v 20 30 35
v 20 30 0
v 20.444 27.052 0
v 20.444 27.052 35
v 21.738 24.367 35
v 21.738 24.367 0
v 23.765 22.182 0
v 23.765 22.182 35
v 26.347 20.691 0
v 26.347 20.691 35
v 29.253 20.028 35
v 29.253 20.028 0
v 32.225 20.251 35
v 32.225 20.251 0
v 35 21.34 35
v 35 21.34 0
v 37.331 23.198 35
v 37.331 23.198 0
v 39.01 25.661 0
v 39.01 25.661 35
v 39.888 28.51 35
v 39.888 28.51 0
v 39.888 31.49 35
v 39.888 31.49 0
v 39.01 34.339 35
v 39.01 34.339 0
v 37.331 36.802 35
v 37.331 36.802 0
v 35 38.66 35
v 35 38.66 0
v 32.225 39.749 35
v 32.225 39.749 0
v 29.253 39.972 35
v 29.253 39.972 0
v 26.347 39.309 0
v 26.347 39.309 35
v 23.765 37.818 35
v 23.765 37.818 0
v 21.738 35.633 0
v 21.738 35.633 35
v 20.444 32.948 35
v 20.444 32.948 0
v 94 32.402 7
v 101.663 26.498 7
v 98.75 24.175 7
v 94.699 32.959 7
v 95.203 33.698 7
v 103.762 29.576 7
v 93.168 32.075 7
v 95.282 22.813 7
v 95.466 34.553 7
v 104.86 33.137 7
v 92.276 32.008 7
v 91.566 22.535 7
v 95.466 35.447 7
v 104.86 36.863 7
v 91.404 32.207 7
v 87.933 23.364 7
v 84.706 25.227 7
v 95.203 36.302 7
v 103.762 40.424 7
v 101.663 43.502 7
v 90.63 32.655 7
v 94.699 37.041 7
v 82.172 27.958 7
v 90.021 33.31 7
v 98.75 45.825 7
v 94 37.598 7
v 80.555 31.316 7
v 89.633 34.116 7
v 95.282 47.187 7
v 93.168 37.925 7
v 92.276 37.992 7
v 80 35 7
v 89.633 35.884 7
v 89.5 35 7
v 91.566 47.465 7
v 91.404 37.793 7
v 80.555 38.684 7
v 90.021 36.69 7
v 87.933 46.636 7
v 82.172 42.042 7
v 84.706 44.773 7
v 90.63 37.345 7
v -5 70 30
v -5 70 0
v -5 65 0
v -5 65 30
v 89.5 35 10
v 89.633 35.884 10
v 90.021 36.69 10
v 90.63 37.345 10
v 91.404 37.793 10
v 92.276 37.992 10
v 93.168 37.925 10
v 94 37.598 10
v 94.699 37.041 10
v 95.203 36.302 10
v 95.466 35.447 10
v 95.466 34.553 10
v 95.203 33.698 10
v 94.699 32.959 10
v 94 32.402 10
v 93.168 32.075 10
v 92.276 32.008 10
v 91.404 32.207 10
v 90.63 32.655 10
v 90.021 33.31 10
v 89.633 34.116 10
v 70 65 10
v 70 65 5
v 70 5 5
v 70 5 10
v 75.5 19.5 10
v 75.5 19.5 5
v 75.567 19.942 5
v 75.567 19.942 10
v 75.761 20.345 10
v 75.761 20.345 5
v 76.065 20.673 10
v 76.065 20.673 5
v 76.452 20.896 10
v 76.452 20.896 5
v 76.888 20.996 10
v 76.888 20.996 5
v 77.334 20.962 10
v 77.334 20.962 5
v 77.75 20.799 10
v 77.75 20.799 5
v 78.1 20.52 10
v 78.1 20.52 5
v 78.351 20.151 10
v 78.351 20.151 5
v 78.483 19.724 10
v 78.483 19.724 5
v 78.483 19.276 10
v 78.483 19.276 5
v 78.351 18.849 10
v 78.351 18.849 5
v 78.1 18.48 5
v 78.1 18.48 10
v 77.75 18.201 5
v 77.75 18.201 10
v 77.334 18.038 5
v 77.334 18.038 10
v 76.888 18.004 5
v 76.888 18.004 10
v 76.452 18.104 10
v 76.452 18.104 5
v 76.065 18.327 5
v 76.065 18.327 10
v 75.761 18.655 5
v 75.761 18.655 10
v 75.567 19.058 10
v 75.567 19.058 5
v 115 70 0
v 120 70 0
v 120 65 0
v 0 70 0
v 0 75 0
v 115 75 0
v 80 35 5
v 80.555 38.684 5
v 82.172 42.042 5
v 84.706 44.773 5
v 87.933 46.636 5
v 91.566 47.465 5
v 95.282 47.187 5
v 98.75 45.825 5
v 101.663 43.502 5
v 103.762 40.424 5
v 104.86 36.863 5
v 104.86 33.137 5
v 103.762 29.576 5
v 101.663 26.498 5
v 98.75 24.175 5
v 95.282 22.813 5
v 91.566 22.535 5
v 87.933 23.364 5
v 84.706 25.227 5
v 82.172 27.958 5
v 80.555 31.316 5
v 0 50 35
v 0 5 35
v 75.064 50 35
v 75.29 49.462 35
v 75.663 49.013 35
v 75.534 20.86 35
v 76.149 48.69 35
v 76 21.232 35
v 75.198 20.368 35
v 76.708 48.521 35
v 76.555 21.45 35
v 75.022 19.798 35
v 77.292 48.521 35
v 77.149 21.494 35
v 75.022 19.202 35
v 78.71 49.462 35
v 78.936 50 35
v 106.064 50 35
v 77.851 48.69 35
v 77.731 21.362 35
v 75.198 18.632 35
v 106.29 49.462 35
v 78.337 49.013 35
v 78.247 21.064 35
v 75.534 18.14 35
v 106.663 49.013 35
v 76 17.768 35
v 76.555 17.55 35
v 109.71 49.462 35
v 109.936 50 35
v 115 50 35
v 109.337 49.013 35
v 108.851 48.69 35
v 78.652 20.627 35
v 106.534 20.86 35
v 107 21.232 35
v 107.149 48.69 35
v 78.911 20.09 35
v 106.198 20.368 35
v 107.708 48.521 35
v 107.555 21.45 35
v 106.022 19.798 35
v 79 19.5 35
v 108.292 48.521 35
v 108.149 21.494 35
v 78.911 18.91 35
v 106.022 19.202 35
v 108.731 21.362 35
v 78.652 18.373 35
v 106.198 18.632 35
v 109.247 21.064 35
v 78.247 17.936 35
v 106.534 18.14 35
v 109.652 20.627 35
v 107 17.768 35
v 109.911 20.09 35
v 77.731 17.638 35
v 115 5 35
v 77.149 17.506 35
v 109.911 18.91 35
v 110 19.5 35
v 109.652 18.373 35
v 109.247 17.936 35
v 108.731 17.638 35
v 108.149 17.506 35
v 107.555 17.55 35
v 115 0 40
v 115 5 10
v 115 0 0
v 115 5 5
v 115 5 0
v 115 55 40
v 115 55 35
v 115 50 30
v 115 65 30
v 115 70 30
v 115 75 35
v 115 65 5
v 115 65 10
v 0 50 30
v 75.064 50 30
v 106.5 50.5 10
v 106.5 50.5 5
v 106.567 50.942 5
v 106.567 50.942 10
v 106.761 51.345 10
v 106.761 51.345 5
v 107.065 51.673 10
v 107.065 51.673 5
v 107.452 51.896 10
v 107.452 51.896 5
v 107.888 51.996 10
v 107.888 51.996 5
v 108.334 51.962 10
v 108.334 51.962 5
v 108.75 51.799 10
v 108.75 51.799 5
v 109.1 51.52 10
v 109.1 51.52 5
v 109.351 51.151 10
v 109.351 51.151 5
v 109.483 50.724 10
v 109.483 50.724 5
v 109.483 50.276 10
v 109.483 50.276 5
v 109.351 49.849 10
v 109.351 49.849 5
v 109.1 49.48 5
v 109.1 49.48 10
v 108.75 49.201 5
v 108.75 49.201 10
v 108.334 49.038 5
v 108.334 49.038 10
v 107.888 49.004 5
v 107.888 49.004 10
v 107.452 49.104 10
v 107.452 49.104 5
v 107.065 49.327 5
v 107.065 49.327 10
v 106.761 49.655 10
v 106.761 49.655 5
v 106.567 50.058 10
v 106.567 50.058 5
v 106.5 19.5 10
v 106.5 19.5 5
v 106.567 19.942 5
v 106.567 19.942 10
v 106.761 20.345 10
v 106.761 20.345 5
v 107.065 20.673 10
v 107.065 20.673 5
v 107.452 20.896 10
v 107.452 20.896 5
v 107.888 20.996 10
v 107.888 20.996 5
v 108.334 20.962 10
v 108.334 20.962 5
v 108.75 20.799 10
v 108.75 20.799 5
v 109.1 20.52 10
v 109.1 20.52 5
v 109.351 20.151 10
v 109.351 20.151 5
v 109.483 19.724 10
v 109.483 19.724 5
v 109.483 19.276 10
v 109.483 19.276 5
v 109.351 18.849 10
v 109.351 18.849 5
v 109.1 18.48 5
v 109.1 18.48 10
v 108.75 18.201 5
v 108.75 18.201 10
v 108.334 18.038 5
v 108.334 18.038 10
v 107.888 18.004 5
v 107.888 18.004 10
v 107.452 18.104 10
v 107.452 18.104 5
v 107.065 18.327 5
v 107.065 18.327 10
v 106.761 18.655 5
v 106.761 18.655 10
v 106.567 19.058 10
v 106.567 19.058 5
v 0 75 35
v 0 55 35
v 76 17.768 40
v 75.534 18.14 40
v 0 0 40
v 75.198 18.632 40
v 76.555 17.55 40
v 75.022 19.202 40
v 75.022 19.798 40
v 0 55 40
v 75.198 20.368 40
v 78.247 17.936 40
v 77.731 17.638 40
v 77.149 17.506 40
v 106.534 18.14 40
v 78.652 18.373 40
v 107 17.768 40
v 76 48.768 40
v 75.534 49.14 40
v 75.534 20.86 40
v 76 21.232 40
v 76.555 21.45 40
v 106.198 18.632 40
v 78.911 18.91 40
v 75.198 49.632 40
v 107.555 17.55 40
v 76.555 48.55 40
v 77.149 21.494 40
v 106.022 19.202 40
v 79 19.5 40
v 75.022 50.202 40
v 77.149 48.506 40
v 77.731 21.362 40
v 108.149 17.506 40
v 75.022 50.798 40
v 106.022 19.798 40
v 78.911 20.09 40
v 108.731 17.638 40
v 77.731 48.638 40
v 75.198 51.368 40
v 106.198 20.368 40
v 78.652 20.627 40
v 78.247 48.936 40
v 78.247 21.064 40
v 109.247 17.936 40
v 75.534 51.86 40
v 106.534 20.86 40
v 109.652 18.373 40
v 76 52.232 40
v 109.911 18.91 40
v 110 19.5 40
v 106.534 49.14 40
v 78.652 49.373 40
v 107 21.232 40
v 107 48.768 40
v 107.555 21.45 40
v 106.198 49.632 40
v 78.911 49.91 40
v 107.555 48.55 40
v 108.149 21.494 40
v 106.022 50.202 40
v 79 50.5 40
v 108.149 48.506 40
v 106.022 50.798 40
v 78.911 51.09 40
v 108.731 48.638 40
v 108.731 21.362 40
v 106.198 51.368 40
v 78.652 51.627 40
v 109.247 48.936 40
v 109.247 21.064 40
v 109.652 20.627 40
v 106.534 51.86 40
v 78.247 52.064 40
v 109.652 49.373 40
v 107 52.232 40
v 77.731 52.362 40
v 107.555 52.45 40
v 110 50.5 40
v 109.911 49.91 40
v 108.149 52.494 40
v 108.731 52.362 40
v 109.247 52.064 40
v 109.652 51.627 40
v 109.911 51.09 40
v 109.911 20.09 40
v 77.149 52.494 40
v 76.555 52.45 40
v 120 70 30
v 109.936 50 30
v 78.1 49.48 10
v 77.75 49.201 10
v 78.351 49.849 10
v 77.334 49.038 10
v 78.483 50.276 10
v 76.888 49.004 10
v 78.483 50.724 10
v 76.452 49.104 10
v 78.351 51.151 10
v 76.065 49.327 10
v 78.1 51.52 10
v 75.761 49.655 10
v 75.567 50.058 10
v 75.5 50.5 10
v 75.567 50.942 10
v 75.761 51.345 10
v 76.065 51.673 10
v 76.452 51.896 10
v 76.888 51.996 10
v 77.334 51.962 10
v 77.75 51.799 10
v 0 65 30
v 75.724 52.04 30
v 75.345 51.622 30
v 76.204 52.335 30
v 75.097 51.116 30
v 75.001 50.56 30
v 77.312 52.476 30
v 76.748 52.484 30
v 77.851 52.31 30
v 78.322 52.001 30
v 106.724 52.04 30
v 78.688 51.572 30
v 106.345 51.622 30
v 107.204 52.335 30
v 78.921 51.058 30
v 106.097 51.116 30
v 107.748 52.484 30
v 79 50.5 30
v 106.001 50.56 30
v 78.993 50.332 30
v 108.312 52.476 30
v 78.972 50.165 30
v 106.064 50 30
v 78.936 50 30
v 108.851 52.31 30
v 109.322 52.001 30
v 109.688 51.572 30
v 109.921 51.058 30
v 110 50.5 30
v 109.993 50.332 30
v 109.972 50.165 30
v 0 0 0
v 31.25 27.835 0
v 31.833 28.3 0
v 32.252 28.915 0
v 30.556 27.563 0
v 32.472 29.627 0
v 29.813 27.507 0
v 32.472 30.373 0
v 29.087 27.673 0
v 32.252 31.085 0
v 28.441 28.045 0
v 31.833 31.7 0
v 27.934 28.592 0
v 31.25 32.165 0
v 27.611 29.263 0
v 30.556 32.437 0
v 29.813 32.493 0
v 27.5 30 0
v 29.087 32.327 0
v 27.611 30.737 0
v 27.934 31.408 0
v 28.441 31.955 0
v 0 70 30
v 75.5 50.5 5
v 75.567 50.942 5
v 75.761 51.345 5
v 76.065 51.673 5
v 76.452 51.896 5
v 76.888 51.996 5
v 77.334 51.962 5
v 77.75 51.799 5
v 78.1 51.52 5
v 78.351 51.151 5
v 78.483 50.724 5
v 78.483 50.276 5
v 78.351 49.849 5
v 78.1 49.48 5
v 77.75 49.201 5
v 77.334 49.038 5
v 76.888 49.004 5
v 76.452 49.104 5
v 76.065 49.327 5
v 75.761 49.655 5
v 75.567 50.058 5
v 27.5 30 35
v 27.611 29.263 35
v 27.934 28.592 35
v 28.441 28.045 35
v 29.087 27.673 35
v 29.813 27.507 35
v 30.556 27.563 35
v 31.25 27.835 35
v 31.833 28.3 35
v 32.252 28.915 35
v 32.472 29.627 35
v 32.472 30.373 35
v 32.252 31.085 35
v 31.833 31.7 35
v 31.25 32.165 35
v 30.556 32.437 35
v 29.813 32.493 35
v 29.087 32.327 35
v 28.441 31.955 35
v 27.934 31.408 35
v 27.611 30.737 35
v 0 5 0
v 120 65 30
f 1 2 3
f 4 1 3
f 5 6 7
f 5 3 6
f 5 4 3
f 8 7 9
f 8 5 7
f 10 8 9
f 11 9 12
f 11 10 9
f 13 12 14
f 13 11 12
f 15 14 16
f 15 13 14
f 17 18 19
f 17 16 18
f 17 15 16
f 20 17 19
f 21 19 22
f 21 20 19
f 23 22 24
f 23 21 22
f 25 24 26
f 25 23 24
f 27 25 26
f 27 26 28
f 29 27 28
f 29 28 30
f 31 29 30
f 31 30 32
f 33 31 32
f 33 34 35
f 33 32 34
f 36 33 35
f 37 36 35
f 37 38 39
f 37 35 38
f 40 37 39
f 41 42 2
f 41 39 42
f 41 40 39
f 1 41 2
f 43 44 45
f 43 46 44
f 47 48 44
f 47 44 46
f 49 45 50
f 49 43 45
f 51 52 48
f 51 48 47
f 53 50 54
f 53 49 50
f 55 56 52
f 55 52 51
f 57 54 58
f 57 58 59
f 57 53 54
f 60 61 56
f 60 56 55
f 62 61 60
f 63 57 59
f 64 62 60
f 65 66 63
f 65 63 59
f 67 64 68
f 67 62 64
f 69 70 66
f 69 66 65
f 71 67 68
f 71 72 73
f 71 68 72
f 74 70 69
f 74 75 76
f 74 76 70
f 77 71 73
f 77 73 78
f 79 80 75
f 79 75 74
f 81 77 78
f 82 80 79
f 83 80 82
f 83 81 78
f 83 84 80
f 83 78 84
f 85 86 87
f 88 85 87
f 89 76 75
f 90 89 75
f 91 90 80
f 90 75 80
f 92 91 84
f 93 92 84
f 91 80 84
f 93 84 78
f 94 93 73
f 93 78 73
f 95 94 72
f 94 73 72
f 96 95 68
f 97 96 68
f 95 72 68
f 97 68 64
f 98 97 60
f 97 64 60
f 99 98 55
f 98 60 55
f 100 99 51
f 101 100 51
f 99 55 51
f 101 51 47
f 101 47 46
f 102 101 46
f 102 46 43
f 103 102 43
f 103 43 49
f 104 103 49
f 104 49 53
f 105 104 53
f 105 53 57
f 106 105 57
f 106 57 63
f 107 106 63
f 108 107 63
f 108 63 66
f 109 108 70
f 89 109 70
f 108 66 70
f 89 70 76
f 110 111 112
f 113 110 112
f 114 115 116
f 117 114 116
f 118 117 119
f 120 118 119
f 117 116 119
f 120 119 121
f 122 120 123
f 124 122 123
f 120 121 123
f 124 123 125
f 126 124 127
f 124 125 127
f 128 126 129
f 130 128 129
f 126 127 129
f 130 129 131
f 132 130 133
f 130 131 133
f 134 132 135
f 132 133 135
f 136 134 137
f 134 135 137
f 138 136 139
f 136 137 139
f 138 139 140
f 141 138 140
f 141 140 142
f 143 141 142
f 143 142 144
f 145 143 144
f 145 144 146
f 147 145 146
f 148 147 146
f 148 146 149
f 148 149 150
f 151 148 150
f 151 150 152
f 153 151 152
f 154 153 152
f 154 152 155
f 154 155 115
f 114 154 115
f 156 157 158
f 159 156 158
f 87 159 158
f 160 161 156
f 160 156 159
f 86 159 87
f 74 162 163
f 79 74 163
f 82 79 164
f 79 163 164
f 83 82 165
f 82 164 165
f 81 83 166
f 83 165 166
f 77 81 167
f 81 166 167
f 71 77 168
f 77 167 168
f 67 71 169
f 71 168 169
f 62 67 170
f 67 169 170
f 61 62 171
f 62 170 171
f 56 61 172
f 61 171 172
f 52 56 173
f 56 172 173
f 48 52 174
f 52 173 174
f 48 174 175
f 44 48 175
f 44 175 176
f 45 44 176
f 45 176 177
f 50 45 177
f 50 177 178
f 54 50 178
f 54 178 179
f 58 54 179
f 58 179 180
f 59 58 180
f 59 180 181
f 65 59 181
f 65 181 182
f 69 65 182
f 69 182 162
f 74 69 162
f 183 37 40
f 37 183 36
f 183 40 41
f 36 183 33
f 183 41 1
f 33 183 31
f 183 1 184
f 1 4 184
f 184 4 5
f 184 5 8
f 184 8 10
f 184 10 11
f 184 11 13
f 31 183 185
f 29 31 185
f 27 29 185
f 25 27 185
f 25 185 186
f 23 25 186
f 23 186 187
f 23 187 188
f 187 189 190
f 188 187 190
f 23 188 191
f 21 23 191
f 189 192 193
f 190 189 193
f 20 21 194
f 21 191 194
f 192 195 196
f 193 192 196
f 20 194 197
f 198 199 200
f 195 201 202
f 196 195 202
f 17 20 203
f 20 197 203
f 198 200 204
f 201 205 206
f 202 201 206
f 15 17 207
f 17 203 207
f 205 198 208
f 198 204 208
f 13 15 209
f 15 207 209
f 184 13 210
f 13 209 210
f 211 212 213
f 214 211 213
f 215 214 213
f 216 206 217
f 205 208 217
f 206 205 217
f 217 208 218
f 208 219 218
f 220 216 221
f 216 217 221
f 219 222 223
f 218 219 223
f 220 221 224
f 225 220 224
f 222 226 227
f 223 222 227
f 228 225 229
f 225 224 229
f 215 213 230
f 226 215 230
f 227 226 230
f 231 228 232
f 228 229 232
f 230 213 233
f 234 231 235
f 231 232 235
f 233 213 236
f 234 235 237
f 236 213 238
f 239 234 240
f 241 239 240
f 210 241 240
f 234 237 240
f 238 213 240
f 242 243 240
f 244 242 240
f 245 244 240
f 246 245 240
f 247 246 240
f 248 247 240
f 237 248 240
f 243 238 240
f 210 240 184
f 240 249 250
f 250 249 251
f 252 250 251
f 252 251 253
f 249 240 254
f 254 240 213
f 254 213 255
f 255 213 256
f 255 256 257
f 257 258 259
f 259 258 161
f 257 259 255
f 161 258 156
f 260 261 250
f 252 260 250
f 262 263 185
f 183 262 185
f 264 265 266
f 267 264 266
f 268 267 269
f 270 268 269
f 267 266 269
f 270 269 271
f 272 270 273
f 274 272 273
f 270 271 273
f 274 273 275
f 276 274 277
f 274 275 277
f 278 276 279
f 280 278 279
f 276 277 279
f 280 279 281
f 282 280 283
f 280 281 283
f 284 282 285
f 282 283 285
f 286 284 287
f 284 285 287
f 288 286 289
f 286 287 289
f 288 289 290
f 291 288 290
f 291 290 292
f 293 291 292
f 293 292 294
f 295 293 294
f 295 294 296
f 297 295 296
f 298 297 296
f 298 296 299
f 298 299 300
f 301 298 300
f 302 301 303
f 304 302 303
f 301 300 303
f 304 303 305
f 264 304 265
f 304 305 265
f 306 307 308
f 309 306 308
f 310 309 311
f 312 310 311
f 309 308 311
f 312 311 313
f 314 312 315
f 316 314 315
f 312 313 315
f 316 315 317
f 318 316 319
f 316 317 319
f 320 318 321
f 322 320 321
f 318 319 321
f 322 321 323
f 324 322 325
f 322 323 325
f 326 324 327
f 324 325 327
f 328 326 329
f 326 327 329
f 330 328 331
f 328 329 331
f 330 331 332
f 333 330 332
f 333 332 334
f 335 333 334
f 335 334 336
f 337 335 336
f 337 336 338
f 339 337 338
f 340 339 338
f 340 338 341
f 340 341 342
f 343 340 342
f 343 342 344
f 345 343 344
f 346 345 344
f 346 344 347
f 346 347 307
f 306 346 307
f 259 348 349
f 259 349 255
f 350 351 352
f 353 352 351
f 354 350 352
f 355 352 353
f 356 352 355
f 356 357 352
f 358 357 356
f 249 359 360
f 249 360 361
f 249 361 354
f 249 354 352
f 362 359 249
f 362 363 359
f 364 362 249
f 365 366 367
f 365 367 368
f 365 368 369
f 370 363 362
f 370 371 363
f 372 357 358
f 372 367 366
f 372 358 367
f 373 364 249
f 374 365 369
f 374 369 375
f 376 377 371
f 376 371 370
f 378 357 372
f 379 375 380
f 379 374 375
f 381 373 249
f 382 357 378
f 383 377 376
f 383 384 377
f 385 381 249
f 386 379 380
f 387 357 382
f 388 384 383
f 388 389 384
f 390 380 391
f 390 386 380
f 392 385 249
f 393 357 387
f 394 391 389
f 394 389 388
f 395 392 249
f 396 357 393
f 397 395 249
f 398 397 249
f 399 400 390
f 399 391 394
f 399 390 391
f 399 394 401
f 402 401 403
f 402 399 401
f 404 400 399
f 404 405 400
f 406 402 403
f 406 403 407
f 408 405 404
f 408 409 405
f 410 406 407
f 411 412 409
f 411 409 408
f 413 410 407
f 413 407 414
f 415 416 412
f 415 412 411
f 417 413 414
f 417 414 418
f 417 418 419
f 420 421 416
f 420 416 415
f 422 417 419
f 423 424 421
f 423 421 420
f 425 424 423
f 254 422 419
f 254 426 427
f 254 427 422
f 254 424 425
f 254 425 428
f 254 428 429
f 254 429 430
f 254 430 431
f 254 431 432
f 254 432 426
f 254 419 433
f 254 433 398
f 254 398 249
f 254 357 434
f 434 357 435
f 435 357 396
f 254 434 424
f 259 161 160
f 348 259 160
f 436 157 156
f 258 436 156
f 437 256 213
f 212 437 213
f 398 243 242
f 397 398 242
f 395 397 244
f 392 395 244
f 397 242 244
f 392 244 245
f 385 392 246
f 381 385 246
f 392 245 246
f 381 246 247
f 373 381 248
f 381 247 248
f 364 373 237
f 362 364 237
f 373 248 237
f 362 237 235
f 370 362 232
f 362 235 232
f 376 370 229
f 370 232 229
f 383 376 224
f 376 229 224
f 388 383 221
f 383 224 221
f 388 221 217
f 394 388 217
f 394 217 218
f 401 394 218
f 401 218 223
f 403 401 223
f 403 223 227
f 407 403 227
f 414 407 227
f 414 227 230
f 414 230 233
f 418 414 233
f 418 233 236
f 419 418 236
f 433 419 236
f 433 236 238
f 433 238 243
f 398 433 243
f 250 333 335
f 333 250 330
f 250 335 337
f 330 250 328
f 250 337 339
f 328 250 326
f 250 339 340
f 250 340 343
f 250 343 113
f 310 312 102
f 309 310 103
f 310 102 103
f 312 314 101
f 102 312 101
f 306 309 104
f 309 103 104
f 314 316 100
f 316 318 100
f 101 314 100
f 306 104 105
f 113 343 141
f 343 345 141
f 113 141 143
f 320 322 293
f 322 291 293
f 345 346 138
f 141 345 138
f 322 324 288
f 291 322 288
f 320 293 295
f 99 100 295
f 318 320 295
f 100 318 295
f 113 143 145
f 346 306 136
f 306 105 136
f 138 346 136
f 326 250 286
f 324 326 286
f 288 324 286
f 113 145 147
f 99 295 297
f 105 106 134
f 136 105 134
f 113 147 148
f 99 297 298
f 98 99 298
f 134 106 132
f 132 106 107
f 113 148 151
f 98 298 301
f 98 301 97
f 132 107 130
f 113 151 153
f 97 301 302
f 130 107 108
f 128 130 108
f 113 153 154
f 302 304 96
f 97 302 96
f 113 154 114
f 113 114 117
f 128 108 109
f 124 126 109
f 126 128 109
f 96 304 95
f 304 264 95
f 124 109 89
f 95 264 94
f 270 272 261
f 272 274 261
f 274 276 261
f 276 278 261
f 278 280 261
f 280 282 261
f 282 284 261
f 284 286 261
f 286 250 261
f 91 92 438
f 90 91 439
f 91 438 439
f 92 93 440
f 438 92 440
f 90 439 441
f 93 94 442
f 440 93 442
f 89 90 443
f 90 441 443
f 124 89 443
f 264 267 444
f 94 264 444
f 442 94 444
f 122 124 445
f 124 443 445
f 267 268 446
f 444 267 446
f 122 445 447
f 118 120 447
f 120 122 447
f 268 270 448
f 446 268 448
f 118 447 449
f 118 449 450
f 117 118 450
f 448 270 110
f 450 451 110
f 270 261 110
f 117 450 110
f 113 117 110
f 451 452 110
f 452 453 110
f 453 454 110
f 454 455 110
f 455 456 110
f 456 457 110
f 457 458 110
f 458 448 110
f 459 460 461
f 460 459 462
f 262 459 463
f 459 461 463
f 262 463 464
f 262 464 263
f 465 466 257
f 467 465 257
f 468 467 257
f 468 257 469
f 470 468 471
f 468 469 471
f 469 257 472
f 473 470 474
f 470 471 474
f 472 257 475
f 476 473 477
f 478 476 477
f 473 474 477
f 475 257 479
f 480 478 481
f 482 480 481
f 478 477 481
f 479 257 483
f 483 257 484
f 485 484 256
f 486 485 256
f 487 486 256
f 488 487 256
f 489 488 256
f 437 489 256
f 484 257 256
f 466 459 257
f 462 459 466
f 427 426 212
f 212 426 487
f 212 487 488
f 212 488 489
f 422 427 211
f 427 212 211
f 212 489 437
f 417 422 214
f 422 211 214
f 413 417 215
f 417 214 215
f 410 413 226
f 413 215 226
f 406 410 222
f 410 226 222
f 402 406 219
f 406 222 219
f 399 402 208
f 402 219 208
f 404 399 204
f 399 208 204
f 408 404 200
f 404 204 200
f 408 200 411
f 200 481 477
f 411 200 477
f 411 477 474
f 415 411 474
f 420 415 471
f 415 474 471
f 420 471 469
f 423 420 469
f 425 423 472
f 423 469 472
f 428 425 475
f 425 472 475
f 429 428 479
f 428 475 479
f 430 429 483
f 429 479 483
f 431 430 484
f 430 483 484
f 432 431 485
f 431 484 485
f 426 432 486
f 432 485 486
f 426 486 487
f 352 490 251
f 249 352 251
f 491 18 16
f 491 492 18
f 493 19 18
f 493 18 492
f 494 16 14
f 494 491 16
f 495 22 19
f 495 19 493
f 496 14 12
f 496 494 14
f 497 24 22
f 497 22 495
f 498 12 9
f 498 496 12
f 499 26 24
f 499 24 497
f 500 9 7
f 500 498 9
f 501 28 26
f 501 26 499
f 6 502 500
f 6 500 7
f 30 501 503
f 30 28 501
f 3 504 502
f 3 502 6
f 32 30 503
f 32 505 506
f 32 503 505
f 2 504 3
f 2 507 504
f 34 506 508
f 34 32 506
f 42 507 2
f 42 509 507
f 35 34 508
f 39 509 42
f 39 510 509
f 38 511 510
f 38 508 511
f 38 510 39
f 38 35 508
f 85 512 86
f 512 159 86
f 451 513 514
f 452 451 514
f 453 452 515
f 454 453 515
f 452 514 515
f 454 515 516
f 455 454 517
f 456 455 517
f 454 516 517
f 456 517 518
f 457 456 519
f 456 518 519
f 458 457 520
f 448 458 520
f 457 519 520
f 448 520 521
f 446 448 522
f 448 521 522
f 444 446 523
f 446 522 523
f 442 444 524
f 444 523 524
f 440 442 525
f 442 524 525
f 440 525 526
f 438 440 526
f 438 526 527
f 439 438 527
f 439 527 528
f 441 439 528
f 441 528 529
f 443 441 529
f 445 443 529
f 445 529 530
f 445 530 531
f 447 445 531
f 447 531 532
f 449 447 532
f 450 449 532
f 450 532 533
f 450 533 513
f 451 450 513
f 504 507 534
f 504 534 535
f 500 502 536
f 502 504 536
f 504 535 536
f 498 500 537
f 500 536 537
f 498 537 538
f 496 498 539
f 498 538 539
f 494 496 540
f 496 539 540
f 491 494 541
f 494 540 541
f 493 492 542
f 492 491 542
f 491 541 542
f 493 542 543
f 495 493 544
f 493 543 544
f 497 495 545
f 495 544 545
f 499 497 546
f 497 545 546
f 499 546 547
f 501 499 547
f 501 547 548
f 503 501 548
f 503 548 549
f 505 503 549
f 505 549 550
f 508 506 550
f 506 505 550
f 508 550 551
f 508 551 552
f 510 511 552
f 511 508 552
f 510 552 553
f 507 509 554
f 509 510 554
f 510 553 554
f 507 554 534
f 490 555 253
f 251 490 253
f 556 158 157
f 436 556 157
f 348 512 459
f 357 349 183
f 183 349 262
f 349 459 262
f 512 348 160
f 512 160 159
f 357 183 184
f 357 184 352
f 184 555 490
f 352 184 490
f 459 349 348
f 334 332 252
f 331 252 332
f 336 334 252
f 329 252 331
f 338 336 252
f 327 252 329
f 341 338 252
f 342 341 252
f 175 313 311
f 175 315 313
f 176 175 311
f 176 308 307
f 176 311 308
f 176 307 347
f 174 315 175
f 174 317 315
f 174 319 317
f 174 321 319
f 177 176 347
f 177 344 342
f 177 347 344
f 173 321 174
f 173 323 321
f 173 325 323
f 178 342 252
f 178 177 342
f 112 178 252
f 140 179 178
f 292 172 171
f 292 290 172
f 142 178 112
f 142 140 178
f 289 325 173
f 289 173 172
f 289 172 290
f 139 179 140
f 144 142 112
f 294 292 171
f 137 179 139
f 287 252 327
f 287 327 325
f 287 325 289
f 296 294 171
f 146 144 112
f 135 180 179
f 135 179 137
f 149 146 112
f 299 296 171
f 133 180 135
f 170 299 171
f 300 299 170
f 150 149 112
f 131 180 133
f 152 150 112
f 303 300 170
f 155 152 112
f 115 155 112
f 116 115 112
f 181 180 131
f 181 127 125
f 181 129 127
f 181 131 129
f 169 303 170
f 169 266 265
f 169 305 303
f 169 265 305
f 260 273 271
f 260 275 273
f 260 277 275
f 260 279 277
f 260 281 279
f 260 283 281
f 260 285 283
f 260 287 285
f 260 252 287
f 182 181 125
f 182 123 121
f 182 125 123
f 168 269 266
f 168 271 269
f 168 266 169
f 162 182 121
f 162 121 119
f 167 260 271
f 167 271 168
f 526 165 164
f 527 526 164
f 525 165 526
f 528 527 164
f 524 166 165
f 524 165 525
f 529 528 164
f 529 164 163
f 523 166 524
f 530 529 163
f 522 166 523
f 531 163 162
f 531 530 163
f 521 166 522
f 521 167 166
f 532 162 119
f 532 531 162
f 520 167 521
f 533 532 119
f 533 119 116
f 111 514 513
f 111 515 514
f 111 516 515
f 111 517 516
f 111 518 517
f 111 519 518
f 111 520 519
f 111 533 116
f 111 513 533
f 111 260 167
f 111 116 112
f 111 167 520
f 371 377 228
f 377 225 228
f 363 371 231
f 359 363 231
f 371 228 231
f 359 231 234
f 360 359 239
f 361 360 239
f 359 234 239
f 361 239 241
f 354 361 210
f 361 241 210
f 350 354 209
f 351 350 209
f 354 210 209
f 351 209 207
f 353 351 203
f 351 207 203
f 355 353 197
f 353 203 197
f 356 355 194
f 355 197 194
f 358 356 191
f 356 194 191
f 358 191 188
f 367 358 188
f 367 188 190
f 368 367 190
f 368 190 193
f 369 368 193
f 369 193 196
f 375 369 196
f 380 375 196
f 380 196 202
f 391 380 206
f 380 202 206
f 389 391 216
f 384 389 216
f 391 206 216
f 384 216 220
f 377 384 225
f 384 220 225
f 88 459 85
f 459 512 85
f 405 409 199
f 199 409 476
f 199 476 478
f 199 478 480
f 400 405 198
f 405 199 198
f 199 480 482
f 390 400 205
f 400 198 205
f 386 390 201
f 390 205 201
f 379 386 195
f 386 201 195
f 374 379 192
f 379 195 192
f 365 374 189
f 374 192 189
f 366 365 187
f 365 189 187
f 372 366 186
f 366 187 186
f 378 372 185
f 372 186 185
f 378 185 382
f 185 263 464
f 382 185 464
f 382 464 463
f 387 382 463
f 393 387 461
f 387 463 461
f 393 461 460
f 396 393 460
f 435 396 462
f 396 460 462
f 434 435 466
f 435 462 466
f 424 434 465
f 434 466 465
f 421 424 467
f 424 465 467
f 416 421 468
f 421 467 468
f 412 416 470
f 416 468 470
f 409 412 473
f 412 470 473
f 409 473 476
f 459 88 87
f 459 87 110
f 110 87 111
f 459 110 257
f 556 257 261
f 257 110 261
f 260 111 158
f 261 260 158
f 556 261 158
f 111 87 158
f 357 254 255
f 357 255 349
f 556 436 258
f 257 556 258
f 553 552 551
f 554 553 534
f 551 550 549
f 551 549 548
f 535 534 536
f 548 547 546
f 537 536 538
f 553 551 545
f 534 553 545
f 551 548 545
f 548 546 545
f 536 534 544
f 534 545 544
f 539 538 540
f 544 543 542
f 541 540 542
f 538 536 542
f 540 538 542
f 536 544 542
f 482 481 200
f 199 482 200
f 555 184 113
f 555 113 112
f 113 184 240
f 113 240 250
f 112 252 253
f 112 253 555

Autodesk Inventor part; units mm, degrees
ref_plane "YZ Plane" through (0, 0, 0) normal (1, 0, 0) x (0, 1, 0)
ref_plane "XZ Plane" through (0, 0, 0) normal (0, 1, 0) x (-1, 0, 0)
sketch "Sketch1" plane through (0, 0, 0) normal (0, 0, 1) x (1, 0, 0)
  line L0 (0, 0) -> (115, 0)
  line L1 (115, 0) -> (115, 75)
  line L2 (115, 75) -> (0, 75)
  line L3 (0, 75) -> (0, 0)
  dimension "d0" = 115
  dimension "d1" = 75
extrude "Extrusion1" add sketch "Sketch1" along normal blind 40
sketch "Sketch2" plane through (0, 0, 40) normal (0, 0, 1) x (1, 0, 0)
  line L0 (115, 75) -> (0, 75) projected
  line L1 (115, 0) -> (115, 75) projected
  line L2 (0, 75) -> (115, 75)
  line L3 (115, 75) -> (115, 55)
  line L4 (115, 55) -> (0, 55)
  line L5 (0, 55) -> (0, 75)
  point P0 (0, 0)
  dimension "d4" = 20
extrude "Extrusion2" cut sketch "Sketch2" against normal blind 5
sketch "Sketch3" plane through (115, 0, 0) normal (1, 0, 0) x (0, 0, -1)
  line L0 (0, 75) -> (-35, 75) projected
  line L1 (-35, 75) -> (-35, 55) projected
  line L2 (-35, 55) -> (-40, 55) projected
  line L3 (-40, 0) -> (-40, 55) projected
  line L4 (0, 0) -> (-40, 0) projected
  line L5 (0, 70) -> (-30, 70)
  line L6 (-30, 70) -> (-30, 50)
  line L7 (-30, 50) -> (-35, 50)
  line L8 (-35, 50) -> (-35, 5)
  line L9 (-35, 5) -> (0, 5)
  line L10 (0, 5) -> (0, 70)
  line L11 (0, 0) -> (0, 75) projected
  dimension "d7" = 5
extrude "Extrusion3" cut sketch "Sketch3" against normal through all contours L10 L9 L8 L7 L6 L5
sketch "Sketch11" plane through (0, 0, 0) normal (0, 0, -1) x (-1, 0, 0)
  line L0 (-120, 70) -> (5, 70)
  line L1 (5, 70) -> (5, 65)
  line L2 (5, 65) -> (-120, 65)
  line L3 (-120, 65) -> (-120, 70)
  line L4 (-115, 70) -> (-115, 75) projected
  point P0 (0, 0)
  point P1 (0, 70)
  dimension "d42" = 5
  dimension "d43" = 5
  dimension "d44" = 5
extrude "Extrusion11" add sketch "Sketch11" against normal blind 30
ref_plane "Work Plane2" through (0, 0, 5) normal (0, 0, -1) x (-1, 0, 0)
sketch "Sketch12" plane through (0, 0, 5) normal (0, 0, -1) x (-1, 0, 0)
  line L0 (-115, 50) -> (-115, 65)
  line L1 (-115, 5) -> (0, 5)
  line L2 (-115, 65) -> (-70, 65)
  line L3 (-70, 65) -> (-70, 5)
  line L4 (-70, 5) -> (-115, 5)
  line L5 (-115, 5) -> (-115, 65)
  line L6 (-108, 50.5) -> (-77, 50.5) construction
  line L7 (-77, 50.5) -> (-77, 19.5) construction
  line L8 (-77, 19.5) -> (-108, 19.5) construction
  line L9 (-108, 19.5) -> (-108, 50.5) construction
  circle A0 centre (-77, 50.5) radius 1.5
  circle A1 centre (-108, 50.5) radius 1.5
  circle A2 centre (-77, 19.5) radius 1.5
  circle A3 centre (-108, 19.5) radius 1.5
  circle A4 centre (-92.5, 35) radius 3
  point P0 (0, 0)
  point P1 (-5, 5)
  point P2 (-92.5, 50.5)
  point P3 (-92.5, 65)
  point P4 (-108, 35)
  point P5 (-115, 35)
  dimension "d47" = 45
  dimension "d48" = 31
  dimension "d49" = 31
  dimension "d50" = 3
  dimension "d51" = 3
  dimension "d52" = 3
  dimension "d53" = 3
  dimension "d54" = 6
extrude "Extrusion12" add sketch "Sketch12" against normal blind 5
sketch "Sketch13" plane through (0, 0, 5) normal (0, 0, -1) x (-1, 0, 0)
  circle A0 centre (-92.5, 35) radius 3
  circle A1 centre (-92.5, 35) radius 12.5
  point P0 (0, 0)
  dimension "d57" = 25
extrude "Extrusion13" cut sketch "Sketch13" against normal blind 2
sketch "Sketch15" plane through (0, 0, 10) normal (0, 0, 1) x (1, 0, 0)
  circle A0 centre (108, 50.5) radius 1.5 projected
  circle A1 centre (108, 19.5) radius 1.5 projected
  circle A2 centre (77, 50.5) radius 1.5 projected
  circle A3 centre (77, 19.5) radius 1.5 projected
  circle A4 centre (77, 50.5) radius 2
  circle A5 centre (108, 50.5) radius 2
  circle A6 centre (108, 19.5) radius 2
  circle A7 centre (77, 19.5) radius 2
  point P0 (0, 0)
  dimension "d60" = 4
  dimension "d61" = 4
  dimension "d62" = 4
  dimension "d63" = 4
extrude "Extrusion14" cut sketch "Sketch15" along normal through all contours A0 | A1 | A2 | A3 | A4 | A5 | A6 | A7
sketch "Sketch16" plane through (115, 5, 35) normal (0, 0, -1) x (-1, 0, 0)
  circle A0 centre (85, 25) radius 10
  circle A1 centre (85, 25) radius 2.5
  line L0 (115, 45) -> (115, 0) projected
  line L1 (115, -5) -> (0, -5) projected
  dimension "d66" = 20
  dimension "d67" = 5
  dimension "d68" = 30
  dimension "d69" = 30
extrude "Extrusion15" add sketch "Sketch16" along normal blind 35
properties part number "FA003" material "ABS Plastic"
